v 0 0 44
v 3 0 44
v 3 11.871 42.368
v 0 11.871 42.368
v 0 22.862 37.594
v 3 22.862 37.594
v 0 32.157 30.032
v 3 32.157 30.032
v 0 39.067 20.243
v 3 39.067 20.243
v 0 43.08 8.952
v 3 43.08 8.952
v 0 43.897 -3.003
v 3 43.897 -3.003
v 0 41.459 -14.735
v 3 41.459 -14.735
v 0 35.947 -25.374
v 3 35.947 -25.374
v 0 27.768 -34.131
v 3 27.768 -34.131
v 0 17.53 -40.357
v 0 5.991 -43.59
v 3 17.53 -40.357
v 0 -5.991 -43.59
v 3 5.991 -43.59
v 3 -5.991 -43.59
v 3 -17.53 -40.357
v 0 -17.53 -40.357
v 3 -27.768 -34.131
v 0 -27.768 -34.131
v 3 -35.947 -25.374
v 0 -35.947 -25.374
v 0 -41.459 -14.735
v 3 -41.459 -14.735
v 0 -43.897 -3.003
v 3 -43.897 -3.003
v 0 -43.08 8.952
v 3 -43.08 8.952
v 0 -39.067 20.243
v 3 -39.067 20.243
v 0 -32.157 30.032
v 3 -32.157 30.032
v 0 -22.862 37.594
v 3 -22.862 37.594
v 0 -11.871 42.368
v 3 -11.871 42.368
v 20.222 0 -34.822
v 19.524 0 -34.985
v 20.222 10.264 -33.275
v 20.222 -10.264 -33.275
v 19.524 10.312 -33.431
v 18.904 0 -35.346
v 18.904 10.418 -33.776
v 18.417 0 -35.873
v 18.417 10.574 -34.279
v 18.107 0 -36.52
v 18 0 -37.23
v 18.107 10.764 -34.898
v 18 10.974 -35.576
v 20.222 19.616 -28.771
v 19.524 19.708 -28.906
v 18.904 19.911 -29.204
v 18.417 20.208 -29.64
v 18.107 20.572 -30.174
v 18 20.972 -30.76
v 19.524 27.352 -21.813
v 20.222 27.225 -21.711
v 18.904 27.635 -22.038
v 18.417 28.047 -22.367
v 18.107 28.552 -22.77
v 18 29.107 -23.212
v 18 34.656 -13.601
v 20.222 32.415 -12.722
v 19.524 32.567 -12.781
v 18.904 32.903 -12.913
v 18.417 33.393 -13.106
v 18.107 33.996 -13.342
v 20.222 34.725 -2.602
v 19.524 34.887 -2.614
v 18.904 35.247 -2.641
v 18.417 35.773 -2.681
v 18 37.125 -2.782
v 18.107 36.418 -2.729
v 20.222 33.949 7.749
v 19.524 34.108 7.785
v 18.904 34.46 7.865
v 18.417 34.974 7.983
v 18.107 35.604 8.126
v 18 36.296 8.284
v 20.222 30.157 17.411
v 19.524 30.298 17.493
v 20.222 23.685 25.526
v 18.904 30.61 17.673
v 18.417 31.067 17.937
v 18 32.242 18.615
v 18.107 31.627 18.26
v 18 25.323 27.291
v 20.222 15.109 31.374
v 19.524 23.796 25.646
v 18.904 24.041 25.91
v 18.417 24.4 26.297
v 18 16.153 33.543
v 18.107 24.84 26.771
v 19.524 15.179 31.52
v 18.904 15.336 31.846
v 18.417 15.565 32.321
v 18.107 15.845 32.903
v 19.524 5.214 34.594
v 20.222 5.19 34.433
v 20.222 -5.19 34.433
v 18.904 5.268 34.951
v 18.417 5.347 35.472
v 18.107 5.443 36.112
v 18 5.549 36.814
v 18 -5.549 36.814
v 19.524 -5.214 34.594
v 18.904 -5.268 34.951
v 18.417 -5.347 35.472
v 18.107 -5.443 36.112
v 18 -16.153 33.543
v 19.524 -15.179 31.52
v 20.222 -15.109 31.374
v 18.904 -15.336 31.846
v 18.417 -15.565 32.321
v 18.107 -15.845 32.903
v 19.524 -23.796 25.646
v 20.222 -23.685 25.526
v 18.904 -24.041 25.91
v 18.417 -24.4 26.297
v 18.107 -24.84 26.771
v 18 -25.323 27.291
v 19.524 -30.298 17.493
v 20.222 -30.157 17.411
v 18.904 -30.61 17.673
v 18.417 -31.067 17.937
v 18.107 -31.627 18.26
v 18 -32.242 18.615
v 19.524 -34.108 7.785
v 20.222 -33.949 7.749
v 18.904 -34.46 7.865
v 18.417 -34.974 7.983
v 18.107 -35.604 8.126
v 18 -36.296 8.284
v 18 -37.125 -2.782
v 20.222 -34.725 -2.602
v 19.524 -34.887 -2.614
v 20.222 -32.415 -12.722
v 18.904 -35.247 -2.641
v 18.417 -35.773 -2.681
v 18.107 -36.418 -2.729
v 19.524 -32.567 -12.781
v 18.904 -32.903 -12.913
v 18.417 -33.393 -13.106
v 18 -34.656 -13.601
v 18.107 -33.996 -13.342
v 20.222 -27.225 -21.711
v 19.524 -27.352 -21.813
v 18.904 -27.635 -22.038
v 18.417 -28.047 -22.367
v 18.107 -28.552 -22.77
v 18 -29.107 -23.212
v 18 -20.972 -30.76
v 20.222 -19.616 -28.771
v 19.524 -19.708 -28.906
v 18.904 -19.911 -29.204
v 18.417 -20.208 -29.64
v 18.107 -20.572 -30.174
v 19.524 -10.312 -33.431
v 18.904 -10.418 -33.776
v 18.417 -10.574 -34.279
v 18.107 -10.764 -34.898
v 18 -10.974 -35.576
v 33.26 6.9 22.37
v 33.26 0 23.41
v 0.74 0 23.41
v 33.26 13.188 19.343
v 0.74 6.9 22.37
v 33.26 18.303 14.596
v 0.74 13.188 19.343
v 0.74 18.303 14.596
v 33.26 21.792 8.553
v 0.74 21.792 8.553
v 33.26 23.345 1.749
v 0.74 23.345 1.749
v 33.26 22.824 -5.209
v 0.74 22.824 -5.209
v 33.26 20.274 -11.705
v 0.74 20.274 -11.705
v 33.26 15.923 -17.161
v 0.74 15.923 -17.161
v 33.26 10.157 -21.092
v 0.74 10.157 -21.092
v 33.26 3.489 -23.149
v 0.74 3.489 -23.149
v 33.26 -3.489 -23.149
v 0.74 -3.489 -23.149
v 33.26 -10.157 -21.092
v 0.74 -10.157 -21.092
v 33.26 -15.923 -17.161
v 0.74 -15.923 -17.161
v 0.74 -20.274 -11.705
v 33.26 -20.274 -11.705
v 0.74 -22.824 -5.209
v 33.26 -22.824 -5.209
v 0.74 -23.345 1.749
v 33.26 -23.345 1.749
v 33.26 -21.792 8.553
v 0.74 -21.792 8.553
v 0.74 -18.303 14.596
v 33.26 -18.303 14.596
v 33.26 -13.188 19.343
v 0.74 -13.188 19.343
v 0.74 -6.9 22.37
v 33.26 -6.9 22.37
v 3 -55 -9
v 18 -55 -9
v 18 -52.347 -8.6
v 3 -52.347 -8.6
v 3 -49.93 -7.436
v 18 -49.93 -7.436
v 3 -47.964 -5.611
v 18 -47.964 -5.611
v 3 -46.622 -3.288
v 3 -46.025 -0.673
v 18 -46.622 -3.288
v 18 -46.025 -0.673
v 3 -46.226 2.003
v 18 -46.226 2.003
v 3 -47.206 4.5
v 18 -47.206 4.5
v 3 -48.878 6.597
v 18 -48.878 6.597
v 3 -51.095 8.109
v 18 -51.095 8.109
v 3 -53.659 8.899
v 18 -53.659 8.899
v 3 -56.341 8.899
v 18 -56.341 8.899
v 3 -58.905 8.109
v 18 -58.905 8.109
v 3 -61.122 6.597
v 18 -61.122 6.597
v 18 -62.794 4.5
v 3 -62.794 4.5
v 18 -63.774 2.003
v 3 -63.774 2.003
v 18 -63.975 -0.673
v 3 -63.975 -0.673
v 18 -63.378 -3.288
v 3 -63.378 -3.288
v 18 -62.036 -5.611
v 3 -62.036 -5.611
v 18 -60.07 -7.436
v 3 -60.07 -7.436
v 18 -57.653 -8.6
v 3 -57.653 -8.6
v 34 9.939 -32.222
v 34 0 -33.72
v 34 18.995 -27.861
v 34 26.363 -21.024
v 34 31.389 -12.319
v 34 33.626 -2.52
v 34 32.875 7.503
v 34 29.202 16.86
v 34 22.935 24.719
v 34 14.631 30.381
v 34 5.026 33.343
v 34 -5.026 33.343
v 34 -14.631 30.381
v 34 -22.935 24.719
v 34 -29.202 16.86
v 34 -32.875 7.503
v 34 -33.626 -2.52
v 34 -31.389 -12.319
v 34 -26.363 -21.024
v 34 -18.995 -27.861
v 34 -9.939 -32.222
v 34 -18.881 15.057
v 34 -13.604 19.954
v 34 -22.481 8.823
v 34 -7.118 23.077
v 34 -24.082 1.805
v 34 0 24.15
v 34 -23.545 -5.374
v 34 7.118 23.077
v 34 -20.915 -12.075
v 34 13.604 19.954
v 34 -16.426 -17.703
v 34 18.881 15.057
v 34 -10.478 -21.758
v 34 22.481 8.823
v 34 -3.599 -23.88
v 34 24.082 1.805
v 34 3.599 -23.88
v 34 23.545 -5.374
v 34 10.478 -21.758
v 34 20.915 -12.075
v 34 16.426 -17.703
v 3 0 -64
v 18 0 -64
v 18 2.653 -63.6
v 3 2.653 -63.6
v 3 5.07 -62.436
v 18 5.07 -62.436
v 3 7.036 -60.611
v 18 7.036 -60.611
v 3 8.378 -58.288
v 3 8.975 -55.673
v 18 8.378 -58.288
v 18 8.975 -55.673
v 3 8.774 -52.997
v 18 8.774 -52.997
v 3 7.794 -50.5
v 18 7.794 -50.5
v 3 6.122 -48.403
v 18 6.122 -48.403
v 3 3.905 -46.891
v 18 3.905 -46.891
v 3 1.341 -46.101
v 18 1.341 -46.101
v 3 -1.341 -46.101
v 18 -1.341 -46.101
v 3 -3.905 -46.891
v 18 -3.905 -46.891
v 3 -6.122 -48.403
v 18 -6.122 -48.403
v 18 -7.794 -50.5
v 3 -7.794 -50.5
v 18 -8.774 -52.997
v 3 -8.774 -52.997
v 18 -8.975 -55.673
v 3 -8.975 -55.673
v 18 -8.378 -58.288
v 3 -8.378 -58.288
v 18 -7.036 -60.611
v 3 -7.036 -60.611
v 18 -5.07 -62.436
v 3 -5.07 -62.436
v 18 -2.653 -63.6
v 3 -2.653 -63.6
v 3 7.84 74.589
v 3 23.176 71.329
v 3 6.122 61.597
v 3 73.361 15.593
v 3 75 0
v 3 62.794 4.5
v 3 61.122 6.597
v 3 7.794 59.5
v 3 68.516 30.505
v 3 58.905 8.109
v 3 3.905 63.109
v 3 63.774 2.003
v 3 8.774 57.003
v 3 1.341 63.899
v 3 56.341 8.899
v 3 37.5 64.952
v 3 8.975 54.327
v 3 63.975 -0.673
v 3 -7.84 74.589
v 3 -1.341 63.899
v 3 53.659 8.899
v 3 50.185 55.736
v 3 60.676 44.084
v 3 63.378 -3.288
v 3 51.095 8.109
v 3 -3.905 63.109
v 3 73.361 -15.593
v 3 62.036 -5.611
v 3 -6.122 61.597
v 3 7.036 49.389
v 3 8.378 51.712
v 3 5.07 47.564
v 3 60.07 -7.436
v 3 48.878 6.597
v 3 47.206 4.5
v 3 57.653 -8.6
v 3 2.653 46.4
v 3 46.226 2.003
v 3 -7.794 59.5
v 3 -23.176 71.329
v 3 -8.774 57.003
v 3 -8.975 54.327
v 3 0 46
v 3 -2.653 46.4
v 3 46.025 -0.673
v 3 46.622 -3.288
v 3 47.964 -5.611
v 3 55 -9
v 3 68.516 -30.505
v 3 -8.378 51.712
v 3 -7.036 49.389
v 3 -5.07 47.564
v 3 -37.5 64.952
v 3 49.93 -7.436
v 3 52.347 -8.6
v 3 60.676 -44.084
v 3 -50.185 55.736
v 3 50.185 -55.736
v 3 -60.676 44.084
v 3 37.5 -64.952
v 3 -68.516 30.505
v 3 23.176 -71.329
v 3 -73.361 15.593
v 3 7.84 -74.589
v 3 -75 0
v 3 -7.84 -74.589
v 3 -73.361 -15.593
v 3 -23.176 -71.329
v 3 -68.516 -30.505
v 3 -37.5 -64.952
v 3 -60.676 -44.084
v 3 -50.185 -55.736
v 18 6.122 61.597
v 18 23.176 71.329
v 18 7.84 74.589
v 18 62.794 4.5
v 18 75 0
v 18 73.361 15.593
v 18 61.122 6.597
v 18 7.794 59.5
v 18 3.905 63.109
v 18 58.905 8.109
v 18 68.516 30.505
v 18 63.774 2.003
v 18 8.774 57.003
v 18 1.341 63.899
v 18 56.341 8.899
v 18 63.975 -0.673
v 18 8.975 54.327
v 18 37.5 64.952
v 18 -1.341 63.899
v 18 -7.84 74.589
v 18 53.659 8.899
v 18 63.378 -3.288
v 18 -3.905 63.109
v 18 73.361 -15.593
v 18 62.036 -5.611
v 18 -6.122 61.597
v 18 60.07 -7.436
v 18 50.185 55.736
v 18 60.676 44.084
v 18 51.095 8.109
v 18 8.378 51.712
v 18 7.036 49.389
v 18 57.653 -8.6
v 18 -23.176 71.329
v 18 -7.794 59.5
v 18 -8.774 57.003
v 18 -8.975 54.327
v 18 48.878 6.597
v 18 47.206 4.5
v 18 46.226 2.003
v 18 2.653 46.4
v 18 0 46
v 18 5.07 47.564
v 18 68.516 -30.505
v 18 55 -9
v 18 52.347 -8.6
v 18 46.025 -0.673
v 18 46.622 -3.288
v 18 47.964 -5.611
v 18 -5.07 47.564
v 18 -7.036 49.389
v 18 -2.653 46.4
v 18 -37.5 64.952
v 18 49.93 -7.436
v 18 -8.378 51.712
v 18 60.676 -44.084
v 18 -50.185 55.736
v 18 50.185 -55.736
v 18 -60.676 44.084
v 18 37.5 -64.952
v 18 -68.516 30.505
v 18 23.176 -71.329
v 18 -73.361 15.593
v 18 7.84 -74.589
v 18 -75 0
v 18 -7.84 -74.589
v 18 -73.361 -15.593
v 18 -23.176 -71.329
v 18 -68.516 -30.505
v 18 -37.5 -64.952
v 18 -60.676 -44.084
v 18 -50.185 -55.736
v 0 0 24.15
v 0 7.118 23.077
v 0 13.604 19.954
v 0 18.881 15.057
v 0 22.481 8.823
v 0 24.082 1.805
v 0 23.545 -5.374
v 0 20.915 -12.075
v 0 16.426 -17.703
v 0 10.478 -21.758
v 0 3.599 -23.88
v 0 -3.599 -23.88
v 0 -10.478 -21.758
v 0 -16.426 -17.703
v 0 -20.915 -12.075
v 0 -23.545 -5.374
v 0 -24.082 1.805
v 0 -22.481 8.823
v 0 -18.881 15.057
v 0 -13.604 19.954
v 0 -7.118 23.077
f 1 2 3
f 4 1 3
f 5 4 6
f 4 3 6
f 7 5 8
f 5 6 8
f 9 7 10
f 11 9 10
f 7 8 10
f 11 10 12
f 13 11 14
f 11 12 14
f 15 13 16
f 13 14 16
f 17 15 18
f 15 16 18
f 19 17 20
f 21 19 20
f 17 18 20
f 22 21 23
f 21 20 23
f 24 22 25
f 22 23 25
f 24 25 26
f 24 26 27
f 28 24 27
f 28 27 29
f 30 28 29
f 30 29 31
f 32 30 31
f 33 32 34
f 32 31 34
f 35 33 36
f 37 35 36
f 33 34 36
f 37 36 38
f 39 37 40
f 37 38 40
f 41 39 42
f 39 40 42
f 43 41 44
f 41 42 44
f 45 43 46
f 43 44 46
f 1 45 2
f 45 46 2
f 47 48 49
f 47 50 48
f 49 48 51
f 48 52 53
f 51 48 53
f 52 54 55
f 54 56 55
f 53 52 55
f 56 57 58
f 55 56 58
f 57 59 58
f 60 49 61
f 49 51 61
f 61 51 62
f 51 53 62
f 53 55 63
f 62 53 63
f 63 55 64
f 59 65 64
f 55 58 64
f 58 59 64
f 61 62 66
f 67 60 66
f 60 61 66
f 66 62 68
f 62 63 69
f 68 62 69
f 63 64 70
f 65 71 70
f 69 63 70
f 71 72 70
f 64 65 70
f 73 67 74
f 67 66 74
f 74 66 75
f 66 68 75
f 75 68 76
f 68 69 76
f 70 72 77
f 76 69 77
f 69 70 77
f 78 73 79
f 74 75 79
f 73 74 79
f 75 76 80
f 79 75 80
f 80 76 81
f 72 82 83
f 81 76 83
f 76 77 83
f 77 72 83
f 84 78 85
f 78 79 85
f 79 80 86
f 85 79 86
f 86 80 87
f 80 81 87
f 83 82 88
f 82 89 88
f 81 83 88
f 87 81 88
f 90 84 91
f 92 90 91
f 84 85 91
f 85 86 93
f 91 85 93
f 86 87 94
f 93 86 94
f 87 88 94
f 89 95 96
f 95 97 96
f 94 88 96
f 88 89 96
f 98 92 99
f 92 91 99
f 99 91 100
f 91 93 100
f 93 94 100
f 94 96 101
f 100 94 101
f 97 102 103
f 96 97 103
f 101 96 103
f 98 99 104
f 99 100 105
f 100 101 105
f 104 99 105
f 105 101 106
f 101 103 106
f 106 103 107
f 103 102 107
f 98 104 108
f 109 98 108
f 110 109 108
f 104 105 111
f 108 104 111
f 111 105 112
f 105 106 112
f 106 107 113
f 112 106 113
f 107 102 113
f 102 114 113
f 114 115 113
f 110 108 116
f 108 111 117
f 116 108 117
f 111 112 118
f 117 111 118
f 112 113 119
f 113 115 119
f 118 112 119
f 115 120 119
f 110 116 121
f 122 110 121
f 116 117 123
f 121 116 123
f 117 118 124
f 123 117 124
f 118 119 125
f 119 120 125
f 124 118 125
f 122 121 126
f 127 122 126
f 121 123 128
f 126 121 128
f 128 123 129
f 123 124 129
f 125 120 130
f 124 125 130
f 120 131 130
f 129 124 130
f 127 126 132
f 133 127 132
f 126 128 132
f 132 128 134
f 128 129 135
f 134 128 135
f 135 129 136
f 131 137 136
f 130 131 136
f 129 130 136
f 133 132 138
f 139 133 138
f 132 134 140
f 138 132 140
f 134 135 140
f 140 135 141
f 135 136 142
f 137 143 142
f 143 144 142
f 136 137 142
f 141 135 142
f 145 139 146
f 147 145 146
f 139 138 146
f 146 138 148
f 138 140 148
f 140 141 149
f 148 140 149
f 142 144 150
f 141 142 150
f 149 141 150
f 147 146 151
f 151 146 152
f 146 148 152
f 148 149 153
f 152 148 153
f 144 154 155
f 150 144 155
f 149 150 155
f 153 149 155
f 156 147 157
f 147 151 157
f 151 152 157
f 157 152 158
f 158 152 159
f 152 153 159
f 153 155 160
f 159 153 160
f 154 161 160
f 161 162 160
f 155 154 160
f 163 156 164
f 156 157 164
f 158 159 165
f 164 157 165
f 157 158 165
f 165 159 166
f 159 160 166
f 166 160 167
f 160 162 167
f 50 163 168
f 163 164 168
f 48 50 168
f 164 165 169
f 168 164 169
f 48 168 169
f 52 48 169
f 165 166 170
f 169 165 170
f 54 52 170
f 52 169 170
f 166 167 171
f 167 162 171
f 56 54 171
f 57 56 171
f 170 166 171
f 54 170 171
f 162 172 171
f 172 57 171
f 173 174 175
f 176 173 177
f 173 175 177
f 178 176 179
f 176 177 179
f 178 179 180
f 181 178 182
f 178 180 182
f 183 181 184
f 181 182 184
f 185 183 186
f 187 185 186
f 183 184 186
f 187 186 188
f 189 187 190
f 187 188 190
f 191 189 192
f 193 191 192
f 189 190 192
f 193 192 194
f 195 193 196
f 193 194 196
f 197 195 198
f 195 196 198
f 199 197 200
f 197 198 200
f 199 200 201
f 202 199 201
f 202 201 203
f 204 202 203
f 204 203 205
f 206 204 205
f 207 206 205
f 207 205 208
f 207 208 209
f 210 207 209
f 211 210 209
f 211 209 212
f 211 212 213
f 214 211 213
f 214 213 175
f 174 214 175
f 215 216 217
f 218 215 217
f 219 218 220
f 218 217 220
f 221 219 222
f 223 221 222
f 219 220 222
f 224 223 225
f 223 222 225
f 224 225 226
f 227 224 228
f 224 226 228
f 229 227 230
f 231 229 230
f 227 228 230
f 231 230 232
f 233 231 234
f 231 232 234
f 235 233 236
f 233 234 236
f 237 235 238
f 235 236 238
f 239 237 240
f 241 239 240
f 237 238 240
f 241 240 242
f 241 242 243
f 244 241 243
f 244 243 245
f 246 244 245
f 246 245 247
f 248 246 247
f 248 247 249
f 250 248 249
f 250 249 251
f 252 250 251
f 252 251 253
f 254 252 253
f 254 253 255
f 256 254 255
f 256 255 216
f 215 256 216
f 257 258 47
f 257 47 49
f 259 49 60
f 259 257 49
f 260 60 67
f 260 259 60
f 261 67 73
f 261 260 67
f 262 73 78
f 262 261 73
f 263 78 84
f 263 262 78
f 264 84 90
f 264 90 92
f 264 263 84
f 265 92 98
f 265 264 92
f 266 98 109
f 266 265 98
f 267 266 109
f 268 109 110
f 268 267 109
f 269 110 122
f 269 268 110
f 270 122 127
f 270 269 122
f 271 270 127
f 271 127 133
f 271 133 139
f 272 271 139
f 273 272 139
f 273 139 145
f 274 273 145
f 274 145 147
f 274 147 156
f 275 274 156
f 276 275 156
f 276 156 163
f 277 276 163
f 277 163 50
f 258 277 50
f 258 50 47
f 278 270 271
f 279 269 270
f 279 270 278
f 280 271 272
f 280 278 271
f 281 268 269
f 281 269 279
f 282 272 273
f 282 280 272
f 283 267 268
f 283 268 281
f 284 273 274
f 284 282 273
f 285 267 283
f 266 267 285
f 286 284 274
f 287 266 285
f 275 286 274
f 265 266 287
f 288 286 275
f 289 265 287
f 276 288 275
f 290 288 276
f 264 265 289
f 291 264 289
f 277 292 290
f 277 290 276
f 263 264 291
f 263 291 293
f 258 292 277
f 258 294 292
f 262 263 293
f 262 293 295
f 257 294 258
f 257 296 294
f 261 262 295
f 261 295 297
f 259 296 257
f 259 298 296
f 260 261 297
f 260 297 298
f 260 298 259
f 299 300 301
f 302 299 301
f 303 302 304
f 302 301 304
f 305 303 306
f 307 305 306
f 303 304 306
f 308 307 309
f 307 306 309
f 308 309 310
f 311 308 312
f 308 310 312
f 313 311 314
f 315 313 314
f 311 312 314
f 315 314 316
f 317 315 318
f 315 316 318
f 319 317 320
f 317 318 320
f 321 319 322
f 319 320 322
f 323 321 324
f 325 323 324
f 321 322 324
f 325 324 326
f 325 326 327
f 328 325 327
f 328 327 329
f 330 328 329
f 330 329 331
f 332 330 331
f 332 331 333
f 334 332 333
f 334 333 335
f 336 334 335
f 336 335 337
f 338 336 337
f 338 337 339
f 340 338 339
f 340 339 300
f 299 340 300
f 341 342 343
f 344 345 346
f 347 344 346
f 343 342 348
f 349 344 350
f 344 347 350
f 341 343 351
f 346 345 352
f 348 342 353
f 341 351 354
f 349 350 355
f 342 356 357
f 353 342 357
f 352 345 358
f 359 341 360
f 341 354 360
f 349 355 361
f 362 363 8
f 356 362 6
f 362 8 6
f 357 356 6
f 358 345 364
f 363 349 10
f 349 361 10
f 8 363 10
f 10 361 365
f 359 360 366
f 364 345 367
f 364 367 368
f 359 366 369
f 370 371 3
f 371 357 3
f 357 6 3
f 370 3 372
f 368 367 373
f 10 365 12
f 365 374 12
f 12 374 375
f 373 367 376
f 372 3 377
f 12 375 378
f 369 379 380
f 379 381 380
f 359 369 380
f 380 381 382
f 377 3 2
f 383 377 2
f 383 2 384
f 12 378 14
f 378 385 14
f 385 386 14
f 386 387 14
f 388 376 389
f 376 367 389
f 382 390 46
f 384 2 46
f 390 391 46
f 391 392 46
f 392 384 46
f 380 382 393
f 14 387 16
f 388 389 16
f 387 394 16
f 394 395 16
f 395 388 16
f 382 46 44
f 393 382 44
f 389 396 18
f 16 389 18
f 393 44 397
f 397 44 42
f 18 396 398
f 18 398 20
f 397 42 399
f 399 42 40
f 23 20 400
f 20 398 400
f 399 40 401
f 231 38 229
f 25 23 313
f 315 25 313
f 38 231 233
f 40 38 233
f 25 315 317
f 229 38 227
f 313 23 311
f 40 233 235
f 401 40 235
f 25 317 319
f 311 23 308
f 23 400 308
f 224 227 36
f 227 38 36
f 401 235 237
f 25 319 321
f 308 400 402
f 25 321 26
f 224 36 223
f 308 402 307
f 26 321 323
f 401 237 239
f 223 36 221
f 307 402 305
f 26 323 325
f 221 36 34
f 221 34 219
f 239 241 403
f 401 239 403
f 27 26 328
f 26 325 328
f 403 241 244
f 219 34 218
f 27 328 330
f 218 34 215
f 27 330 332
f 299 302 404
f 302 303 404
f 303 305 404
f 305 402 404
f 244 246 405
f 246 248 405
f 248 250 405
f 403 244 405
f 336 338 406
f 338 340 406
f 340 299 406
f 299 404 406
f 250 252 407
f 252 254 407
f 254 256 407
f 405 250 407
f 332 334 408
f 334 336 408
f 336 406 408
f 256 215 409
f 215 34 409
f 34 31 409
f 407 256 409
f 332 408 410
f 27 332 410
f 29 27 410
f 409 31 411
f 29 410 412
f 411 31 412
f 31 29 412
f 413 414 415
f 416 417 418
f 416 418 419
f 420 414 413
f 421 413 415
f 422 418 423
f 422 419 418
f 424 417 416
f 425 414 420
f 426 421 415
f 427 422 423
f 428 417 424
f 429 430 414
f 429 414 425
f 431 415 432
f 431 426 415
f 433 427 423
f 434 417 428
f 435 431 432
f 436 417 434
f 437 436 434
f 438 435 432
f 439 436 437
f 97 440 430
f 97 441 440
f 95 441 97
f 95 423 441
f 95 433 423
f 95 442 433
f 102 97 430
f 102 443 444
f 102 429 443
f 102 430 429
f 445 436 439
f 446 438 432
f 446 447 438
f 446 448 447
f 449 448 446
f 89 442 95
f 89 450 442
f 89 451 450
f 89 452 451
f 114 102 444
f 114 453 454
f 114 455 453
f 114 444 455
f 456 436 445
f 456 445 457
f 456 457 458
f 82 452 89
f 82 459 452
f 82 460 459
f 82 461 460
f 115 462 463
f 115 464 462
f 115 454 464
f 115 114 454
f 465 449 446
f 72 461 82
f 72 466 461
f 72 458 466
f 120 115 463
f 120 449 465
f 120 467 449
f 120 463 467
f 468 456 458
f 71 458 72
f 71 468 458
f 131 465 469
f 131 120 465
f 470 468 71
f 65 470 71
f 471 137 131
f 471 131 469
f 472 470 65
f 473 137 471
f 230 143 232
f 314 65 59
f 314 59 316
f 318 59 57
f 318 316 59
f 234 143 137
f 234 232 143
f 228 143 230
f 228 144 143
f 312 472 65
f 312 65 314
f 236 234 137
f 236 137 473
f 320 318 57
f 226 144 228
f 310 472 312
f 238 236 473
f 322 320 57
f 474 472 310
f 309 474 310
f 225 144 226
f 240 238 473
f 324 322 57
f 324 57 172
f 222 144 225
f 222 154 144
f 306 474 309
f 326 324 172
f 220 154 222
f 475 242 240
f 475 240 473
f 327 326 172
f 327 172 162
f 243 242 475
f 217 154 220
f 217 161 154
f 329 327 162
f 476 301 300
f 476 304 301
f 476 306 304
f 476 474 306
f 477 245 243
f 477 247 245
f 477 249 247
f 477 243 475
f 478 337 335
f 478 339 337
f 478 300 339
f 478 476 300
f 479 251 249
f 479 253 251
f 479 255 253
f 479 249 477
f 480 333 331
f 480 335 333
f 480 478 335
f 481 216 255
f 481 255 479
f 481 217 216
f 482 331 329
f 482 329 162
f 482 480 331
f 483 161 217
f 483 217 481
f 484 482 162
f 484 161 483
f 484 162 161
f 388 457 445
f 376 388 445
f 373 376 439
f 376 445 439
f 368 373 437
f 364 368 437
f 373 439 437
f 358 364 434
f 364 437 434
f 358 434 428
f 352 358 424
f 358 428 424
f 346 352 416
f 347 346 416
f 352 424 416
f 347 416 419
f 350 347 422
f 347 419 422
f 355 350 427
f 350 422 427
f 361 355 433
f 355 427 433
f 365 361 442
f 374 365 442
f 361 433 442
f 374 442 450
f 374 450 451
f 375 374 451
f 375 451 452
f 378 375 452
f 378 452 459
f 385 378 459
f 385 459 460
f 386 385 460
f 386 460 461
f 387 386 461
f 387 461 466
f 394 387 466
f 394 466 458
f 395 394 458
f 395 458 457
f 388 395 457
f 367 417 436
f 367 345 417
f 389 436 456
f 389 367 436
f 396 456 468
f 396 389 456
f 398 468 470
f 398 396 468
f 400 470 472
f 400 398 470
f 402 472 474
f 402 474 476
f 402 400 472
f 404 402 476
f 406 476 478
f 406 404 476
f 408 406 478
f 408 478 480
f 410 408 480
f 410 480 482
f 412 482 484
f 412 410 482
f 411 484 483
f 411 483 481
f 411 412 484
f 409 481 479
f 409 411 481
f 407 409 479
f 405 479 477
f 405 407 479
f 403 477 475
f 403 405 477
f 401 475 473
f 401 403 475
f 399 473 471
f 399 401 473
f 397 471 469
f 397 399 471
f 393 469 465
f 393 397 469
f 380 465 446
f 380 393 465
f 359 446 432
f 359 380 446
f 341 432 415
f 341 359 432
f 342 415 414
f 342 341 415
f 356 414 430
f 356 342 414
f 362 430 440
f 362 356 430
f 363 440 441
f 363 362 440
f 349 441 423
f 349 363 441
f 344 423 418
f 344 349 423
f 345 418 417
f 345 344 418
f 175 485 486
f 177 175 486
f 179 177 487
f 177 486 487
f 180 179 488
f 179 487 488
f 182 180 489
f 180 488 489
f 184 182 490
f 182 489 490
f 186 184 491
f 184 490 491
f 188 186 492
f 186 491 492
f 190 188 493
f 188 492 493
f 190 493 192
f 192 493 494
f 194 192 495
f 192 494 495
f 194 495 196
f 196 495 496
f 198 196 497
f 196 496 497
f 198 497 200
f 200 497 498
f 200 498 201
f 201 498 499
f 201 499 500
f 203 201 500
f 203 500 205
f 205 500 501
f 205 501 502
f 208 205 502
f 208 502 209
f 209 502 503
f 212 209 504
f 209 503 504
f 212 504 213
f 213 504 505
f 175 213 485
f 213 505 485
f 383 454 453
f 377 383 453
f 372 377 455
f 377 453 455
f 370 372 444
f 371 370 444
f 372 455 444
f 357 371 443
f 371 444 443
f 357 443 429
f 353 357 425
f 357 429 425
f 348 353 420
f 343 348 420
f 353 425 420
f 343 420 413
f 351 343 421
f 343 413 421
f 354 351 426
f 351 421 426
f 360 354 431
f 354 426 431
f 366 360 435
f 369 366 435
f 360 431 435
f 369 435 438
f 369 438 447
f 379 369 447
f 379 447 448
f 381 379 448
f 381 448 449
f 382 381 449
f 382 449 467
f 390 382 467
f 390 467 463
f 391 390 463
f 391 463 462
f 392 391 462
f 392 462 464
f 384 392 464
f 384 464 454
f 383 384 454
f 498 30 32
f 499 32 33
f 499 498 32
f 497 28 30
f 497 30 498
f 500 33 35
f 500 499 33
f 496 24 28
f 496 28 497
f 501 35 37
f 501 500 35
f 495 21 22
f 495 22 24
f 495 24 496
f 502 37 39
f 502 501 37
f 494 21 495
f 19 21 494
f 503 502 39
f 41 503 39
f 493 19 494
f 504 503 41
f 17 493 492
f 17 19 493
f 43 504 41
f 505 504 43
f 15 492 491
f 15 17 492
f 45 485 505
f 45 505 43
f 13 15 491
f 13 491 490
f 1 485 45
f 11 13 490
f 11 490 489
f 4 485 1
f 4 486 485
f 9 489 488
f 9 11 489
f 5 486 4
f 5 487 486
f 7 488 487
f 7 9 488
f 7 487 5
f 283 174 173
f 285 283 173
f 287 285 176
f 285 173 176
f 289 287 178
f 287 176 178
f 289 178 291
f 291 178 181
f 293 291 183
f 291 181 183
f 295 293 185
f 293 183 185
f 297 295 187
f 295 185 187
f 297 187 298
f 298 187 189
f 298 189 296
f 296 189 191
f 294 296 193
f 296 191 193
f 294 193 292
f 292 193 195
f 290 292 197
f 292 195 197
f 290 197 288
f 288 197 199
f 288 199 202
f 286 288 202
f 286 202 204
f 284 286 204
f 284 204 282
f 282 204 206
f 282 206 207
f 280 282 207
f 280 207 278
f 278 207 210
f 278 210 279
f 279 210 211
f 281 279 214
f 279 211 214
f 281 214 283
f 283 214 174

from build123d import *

# Parameters (mm, degrees)
SKETCH1_W                      = 15
SKETCH1_H                      = 75
SKETCH2_R                      = 44
BOSS_EXTRUDE1_DEPTH            = 3
SKETCH3_R                      = 35
BOSS_EXTRUDE2_DEPTH            = 16
BOSS_EXTRUDE2_TAPER            = 4.57392126
F_18_0_18_DIAMETER_HOLE1_D     = 18
F_18_0_18_DIAMETER_HOLE1_DEPTH = 31
M42_CLEARANCE_HOLE1_D          = 46.820907
M42_CLEARANCE_HOLE1_DEPTH      = 34
CHAMFER1_SIZE                  = 0.7395465
FILLET1_R                      = 2.415


with BuildPart() as part:
    # Sketch1 → Revolve1 (revolve)
    with BuildSketch(Plane(origin=(0, 0, 0), x_dir=(-1, 0, 0), z_dir=(0, 0, -1))):
        with Locations((-10.5, 37.5)):
            Rectangle(SKETCH1_W, SKETCH1_H)
    revolve(axis=Axis((18, 0, 0), (-1, 0, 0)))

    # Sketch2 → Boss-Extrude1 (add)
    with BuildSketch(Plane.ZY.offset(-3)):
        Circle(SKETCH2_R)
    extrude(amount=BOSS_EXTRUDE1_DEPTH)

    # Sketch3 → Boss-Extrude2 (add)
    with BuildSketch(Plane(origin=(18, 0, 0), x_dir=(0, 0, -1), z_dir=(1, 0, 0))):
        Circle(SKETCH3_R)
    extrude(amount=BOSS_EXTRUDE2_DEPTH, taper=BOSS_EXTRUDE2_TAPER)

    # Ø18.0 (18) Diameter Hole1
    with Locations(Plane.ZY.offset(-3)):
        with Locations((0, -55), (-55, 0), (0, 55), (55, 0)):
            Hole(F_18_0_18_DIAMETER_HOLE1_D / 2, depth=F_18_0_18_DIAMETER_HOLE1_DEPTH)

    # M42 Clearance Hole1
    with Locations(Plane(origin=(34, 0, 0), x_dir=(0, 0, -1), z_dir=(1, 0, 0))):
        with Locations((0, 0)):
            Hole(M42_CLEARANCE_HOLE1_D / 2, depth=M42_CLEARANCE_HOLE1_DEPTH)

    # Chamfer1
    chamfer1_edges = [part.edges().sort_by_distance(p)[0] for p in [
        (34, 0, -23.4104535),
        (0, 0, -23.4104535),
    ]]
    chamfer(chamfer1_edges, length=CHAMFER1_SIZE)

    # Fillet1
    fillet1_edges = [part.edges().sort_by_distance(p)[0] for p in [
        (18, 0, 35),
    ]]
    fillet(fillet1_edges, radius=FILLET1_R)


solid = part.part
